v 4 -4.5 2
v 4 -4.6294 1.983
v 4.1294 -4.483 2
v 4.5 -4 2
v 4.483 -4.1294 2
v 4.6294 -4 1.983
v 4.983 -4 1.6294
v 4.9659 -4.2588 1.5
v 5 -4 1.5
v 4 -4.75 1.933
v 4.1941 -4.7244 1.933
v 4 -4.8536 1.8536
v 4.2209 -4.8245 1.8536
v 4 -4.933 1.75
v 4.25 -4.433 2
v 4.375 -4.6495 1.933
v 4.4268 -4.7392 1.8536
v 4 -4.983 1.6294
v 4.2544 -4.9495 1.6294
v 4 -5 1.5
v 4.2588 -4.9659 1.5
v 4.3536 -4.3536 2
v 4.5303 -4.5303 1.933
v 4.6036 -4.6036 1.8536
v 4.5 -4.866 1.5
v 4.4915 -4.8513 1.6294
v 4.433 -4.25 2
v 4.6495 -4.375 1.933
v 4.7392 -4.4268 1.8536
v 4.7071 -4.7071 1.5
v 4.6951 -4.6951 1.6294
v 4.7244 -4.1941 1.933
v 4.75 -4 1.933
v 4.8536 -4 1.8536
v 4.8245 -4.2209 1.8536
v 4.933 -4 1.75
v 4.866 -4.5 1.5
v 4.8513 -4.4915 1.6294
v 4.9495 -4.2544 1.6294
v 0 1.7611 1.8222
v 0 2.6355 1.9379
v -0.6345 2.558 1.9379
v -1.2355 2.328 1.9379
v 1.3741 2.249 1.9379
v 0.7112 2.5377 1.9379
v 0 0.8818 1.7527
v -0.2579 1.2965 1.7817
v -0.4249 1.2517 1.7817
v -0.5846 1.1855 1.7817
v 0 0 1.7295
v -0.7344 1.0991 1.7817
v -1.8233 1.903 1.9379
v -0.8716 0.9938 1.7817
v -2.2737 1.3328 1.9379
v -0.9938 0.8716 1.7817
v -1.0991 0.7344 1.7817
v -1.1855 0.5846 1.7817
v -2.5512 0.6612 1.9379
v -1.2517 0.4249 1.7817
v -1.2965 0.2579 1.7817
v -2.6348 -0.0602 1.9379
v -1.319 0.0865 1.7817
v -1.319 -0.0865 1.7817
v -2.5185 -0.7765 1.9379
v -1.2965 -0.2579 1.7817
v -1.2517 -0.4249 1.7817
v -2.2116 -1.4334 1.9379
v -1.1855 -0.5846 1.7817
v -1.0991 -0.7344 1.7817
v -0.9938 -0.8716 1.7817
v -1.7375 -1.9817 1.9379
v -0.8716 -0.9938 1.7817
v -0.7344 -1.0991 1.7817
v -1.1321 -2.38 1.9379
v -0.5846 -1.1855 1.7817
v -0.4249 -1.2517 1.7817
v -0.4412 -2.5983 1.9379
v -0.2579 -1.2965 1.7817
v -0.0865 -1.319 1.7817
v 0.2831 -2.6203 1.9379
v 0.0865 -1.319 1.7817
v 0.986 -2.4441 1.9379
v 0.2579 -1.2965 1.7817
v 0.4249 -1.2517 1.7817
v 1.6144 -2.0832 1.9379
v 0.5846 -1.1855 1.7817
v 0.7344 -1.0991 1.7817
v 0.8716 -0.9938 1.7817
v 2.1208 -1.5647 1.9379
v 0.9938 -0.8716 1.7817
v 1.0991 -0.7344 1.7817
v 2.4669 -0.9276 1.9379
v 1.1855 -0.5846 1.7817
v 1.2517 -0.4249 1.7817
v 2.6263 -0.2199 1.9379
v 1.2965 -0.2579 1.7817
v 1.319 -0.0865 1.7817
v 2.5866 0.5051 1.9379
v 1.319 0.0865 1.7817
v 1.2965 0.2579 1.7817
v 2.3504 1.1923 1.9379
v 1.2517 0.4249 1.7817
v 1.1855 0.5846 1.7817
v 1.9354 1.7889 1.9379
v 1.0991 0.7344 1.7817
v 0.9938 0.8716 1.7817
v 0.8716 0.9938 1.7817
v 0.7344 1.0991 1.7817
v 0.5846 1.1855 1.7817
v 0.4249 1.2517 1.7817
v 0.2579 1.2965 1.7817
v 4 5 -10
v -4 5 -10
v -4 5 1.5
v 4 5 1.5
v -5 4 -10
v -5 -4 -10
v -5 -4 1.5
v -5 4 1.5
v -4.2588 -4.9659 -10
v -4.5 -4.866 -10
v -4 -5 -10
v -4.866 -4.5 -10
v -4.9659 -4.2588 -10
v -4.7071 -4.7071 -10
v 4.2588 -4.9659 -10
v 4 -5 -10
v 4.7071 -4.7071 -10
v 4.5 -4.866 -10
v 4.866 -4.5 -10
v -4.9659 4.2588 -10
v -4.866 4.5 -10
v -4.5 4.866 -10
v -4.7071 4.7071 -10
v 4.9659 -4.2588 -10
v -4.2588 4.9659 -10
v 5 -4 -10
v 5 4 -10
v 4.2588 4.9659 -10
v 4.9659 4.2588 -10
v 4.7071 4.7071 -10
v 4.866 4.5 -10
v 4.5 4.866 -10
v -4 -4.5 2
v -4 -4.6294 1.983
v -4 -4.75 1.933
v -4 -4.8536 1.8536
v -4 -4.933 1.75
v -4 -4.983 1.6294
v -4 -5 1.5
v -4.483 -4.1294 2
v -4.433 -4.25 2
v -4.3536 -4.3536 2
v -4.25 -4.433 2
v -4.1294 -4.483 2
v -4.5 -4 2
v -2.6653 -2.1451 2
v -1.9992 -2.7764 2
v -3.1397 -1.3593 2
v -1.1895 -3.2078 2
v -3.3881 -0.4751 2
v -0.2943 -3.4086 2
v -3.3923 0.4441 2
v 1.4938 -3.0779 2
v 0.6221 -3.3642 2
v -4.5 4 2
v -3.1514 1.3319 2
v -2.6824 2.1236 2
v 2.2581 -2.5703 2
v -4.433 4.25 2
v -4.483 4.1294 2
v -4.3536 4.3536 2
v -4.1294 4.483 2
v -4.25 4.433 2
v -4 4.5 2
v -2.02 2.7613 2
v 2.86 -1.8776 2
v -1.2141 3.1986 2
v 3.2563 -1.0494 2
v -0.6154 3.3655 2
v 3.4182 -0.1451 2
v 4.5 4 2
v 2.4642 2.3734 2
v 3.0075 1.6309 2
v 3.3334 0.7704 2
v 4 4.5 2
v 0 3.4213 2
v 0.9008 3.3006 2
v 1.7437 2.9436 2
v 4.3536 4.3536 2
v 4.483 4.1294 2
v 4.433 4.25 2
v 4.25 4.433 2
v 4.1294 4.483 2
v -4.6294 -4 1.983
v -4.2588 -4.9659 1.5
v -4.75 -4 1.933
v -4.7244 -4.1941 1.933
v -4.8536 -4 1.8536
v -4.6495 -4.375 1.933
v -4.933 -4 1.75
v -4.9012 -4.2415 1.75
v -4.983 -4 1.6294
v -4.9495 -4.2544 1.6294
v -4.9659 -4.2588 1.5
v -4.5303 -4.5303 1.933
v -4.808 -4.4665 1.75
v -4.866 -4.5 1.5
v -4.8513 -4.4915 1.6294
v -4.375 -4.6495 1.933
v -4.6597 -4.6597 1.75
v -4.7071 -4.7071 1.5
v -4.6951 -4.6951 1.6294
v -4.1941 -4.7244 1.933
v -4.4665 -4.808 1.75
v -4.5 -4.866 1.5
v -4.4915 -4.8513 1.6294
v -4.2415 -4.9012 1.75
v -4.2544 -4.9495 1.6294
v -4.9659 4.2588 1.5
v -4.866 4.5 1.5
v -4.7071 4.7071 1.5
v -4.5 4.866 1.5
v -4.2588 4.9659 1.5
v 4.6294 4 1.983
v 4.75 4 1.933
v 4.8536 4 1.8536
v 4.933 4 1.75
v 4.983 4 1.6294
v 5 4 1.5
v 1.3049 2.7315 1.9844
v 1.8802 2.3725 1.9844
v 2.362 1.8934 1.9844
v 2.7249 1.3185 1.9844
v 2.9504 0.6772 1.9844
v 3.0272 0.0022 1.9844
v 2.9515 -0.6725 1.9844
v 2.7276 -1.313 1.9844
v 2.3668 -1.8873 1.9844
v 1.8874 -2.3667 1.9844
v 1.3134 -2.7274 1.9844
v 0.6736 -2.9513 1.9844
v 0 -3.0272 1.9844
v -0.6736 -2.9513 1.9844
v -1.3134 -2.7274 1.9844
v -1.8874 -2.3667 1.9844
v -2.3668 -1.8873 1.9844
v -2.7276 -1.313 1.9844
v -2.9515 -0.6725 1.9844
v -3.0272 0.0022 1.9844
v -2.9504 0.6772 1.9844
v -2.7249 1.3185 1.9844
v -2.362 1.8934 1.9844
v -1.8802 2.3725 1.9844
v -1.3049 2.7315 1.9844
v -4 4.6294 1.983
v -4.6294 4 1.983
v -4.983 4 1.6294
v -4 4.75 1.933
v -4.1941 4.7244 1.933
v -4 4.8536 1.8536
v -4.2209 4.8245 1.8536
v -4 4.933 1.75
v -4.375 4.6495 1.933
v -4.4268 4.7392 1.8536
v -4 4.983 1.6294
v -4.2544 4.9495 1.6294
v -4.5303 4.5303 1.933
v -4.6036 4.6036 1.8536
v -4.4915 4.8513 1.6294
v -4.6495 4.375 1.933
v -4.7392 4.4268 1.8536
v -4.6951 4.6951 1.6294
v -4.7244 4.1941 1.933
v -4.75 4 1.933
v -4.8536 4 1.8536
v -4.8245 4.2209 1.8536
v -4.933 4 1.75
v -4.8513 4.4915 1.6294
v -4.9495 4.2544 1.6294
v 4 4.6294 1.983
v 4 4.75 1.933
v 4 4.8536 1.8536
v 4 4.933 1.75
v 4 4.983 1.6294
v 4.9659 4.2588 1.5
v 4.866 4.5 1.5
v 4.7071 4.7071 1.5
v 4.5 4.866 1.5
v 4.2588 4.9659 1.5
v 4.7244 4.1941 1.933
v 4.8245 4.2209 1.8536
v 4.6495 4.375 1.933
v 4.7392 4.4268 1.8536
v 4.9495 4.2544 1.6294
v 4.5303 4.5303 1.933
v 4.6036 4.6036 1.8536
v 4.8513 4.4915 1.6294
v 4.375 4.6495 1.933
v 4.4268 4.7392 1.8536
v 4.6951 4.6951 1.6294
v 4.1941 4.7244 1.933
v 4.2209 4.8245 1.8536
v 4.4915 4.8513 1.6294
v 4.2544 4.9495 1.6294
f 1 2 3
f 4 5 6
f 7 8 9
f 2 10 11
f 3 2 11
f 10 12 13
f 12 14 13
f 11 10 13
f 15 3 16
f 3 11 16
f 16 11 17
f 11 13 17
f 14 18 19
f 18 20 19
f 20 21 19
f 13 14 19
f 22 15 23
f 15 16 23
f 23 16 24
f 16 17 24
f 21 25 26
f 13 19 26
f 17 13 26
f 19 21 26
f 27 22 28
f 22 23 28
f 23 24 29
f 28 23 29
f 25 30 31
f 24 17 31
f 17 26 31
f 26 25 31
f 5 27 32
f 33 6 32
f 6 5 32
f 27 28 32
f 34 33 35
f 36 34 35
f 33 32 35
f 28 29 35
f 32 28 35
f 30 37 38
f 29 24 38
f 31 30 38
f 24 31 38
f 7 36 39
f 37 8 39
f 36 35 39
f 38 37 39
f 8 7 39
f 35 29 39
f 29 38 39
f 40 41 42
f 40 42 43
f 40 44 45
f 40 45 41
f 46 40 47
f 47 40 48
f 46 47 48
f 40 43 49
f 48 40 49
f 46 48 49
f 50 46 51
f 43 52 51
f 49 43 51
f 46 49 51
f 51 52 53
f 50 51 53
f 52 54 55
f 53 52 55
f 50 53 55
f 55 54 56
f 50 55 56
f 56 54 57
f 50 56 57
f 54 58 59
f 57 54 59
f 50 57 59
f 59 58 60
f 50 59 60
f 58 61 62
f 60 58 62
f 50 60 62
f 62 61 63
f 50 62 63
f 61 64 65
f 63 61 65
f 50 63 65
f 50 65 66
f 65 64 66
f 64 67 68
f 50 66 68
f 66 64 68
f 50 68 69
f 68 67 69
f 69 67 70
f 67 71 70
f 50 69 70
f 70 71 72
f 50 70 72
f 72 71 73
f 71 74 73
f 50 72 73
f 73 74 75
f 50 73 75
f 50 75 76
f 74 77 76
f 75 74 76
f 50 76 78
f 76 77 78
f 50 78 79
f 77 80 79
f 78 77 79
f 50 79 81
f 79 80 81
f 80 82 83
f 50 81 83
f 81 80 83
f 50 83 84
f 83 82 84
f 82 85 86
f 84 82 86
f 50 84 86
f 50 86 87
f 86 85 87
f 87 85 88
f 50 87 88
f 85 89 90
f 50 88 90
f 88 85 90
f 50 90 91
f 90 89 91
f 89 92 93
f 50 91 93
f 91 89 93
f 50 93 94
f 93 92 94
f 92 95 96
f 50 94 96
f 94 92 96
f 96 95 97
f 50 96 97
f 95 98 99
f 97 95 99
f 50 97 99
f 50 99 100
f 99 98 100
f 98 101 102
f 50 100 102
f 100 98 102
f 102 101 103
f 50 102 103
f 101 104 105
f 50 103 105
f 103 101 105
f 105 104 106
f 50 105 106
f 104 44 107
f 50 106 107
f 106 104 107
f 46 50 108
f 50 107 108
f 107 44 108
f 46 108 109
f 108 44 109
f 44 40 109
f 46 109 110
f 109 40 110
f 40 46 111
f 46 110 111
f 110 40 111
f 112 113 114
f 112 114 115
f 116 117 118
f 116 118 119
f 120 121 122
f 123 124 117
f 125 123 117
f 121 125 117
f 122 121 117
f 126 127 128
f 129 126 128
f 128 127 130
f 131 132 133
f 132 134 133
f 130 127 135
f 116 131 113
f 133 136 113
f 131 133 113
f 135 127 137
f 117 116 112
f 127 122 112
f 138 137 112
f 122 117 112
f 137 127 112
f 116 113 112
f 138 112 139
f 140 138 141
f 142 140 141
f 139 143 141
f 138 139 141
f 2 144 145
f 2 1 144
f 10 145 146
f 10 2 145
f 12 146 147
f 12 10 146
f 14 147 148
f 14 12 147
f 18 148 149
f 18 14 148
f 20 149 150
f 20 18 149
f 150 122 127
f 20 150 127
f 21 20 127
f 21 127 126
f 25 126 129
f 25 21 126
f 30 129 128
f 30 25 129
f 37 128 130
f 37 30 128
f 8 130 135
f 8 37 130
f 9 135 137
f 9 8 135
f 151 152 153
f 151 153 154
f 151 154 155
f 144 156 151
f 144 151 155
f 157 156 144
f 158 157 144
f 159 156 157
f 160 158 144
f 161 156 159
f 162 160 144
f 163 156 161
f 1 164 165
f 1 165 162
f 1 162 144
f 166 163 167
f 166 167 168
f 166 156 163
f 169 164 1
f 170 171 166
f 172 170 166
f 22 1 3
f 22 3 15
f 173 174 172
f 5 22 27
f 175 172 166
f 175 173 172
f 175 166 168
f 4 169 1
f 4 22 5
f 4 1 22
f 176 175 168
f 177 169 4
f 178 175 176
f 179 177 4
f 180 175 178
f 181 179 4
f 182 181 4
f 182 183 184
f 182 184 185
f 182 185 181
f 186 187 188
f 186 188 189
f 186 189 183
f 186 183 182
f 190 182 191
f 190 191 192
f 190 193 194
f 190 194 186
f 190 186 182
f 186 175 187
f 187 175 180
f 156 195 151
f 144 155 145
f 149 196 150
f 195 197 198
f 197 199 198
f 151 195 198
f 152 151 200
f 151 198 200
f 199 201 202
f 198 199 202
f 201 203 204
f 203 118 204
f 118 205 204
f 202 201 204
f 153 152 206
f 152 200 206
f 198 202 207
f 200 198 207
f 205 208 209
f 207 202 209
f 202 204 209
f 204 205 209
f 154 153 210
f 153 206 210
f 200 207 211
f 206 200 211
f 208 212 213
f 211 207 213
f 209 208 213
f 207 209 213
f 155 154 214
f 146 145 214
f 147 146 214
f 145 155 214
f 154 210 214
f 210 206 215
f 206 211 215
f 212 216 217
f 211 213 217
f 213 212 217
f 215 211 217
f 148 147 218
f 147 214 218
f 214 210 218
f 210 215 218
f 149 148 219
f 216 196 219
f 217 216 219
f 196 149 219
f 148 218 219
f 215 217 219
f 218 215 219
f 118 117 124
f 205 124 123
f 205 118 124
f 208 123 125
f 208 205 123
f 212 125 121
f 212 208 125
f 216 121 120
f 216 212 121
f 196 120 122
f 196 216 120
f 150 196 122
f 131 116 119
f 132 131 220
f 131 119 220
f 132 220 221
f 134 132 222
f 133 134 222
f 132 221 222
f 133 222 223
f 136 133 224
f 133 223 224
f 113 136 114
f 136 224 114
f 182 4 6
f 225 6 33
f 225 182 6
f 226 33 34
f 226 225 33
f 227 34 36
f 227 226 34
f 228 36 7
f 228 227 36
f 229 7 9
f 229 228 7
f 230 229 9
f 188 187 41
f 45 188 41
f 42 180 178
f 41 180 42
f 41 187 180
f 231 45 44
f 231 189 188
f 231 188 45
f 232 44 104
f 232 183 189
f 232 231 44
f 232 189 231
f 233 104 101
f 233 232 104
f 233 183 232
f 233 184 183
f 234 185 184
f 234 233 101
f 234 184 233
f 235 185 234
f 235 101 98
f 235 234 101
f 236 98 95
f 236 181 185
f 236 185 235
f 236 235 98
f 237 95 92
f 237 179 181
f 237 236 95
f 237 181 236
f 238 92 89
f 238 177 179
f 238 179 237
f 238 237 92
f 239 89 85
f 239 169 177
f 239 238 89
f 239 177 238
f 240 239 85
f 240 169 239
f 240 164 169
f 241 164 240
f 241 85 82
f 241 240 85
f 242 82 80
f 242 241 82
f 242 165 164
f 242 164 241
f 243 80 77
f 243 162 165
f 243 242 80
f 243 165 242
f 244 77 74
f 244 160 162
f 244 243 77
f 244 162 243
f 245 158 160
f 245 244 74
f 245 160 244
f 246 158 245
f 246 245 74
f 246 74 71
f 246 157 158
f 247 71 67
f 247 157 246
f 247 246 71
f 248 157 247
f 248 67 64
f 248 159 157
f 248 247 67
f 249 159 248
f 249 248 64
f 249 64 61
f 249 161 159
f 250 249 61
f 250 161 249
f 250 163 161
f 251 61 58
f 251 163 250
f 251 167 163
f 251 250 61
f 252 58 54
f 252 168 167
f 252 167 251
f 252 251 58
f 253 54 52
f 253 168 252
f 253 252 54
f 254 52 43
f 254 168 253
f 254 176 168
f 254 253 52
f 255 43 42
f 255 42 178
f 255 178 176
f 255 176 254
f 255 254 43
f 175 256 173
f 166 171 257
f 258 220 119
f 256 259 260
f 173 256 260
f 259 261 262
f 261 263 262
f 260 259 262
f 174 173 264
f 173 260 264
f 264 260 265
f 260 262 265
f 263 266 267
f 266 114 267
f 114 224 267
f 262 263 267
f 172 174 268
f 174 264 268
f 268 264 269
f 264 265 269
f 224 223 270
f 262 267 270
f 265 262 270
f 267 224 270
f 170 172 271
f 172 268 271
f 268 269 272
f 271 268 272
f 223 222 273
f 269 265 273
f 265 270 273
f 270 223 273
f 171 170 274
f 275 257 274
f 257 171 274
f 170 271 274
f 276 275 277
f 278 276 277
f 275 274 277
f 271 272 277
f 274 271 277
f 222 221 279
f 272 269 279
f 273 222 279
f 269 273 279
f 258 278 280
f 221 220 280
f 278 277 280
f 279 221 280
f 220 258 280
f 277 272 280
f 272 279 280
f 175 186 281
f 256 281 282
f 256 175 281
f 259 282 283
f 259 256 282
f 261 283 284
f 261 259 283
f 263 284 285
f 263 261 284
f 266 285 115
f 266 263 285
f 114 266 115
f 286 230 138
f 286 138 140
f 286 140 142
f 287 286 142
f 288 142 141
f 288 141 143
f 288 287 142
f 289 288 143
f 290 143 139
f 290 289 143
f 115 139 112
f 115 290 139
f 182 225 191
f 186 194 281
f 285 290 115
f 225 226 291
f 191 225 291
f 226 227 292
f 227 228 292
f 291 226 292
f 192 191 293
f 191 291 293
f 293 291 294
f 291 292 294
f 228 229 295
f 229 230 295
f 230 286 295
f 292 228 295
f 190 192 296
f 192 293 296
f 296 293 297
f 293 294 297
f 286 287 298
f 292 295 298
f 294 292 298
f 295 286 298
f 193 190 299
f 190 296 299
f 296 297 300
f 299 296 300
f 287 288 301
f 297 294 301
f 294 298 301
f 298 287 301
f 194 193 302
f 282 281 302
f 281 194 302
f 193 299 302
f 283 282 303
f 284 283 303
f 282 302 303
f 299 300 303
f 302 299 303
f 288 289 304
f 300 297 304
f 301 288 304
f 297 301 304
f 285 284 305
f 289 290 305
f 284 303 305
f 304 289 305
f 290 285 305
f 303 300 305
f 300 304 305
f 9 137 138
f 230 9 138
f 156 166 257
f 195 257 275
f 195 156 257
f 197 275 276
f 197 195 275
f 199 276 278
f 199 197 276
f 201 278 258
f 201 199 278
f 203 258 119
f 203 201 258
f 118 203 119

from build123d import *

# Parameters (mm, degrees)
EXTRUDE_1_DEPTH      = 5
EXTRUDE_1_DEPTH_BACK = 7
SKETCH_1_W           = 10
SKETCH_1_H           = 10
FILLET_1_R           = 1
FILLET_2_R           = 0.5
FILLET_3_R           = 5


with BuildPart() as part:
    # Эскиз1 → Бобышка-Вытянуть1 (new, two sides: drawn at the far end of the back side and taken through both)
    with BuildSketch(Plane.XY.offset(-3).offset(-EXTRUDE_1_DEPTH_BACK)):
        Rectangle(SKETCH_1_W, SKETCH_1_H)
    extrude(amount=EXTRUDE_1_DEPTH + EXTRUDE_1_DEPTH_BACK)

    # Скругление1
    fillet_1_edges = [part.edges().sort_by_distance(p)[0] for p in [
        (5, -5, -4),
        (-5, -5, -4),
        (-5, 5, -4),
        (5, 5, -4),
    ]]
    fillet(fillet_1_edges, radius=FILLET_1_R)

    # Скругление2
    fillet_2_edges = [part.edges().sort_by_distance(p)[0] for p in [
        (-4.707106781, -4.707106781, 2),
        (-5, 0, 2),
        (-4.707106781, 4.707106781, 2),
        (0, 5, 2),
        (4.707106781, 4.707106781, 2),
        (5, 0, 2),
        (4.707106781, -4.707106781, 2),
        (0, -5, 2),
    ]]
    fillet(fillet_2_edges, radius=FILLET_2_R)

    # Эскиз2 → Вырез-Повернуть2 (revolve, cut)
    with BuildSketch(Plane(origin=(0, 0, 0), x_dir=(0, 0, -1), z_dir=(1, 0, 0))):
        with BuildLine():
            ThreePointArc((-1.729490169, 0), (-1.797254534, 1.506085619), (-2, 3))
            Line((-2, 3), (-2, 0))
            Line((-2, 0), (-1.729490169, 0))
        make_face()
    revolve(axis=Axis((0, 0, 0), (0, 0, 1)), mode=Mode.SUBTRACT)

    # Скругление3
    fillet_3_edges = [part.edges().sort_by_distance(p)[0] for p in [
        (0, -3, 2),
    ]]
    fillet(fillet_3_edges, radius=FILLET_3_R)


solid = part.part
